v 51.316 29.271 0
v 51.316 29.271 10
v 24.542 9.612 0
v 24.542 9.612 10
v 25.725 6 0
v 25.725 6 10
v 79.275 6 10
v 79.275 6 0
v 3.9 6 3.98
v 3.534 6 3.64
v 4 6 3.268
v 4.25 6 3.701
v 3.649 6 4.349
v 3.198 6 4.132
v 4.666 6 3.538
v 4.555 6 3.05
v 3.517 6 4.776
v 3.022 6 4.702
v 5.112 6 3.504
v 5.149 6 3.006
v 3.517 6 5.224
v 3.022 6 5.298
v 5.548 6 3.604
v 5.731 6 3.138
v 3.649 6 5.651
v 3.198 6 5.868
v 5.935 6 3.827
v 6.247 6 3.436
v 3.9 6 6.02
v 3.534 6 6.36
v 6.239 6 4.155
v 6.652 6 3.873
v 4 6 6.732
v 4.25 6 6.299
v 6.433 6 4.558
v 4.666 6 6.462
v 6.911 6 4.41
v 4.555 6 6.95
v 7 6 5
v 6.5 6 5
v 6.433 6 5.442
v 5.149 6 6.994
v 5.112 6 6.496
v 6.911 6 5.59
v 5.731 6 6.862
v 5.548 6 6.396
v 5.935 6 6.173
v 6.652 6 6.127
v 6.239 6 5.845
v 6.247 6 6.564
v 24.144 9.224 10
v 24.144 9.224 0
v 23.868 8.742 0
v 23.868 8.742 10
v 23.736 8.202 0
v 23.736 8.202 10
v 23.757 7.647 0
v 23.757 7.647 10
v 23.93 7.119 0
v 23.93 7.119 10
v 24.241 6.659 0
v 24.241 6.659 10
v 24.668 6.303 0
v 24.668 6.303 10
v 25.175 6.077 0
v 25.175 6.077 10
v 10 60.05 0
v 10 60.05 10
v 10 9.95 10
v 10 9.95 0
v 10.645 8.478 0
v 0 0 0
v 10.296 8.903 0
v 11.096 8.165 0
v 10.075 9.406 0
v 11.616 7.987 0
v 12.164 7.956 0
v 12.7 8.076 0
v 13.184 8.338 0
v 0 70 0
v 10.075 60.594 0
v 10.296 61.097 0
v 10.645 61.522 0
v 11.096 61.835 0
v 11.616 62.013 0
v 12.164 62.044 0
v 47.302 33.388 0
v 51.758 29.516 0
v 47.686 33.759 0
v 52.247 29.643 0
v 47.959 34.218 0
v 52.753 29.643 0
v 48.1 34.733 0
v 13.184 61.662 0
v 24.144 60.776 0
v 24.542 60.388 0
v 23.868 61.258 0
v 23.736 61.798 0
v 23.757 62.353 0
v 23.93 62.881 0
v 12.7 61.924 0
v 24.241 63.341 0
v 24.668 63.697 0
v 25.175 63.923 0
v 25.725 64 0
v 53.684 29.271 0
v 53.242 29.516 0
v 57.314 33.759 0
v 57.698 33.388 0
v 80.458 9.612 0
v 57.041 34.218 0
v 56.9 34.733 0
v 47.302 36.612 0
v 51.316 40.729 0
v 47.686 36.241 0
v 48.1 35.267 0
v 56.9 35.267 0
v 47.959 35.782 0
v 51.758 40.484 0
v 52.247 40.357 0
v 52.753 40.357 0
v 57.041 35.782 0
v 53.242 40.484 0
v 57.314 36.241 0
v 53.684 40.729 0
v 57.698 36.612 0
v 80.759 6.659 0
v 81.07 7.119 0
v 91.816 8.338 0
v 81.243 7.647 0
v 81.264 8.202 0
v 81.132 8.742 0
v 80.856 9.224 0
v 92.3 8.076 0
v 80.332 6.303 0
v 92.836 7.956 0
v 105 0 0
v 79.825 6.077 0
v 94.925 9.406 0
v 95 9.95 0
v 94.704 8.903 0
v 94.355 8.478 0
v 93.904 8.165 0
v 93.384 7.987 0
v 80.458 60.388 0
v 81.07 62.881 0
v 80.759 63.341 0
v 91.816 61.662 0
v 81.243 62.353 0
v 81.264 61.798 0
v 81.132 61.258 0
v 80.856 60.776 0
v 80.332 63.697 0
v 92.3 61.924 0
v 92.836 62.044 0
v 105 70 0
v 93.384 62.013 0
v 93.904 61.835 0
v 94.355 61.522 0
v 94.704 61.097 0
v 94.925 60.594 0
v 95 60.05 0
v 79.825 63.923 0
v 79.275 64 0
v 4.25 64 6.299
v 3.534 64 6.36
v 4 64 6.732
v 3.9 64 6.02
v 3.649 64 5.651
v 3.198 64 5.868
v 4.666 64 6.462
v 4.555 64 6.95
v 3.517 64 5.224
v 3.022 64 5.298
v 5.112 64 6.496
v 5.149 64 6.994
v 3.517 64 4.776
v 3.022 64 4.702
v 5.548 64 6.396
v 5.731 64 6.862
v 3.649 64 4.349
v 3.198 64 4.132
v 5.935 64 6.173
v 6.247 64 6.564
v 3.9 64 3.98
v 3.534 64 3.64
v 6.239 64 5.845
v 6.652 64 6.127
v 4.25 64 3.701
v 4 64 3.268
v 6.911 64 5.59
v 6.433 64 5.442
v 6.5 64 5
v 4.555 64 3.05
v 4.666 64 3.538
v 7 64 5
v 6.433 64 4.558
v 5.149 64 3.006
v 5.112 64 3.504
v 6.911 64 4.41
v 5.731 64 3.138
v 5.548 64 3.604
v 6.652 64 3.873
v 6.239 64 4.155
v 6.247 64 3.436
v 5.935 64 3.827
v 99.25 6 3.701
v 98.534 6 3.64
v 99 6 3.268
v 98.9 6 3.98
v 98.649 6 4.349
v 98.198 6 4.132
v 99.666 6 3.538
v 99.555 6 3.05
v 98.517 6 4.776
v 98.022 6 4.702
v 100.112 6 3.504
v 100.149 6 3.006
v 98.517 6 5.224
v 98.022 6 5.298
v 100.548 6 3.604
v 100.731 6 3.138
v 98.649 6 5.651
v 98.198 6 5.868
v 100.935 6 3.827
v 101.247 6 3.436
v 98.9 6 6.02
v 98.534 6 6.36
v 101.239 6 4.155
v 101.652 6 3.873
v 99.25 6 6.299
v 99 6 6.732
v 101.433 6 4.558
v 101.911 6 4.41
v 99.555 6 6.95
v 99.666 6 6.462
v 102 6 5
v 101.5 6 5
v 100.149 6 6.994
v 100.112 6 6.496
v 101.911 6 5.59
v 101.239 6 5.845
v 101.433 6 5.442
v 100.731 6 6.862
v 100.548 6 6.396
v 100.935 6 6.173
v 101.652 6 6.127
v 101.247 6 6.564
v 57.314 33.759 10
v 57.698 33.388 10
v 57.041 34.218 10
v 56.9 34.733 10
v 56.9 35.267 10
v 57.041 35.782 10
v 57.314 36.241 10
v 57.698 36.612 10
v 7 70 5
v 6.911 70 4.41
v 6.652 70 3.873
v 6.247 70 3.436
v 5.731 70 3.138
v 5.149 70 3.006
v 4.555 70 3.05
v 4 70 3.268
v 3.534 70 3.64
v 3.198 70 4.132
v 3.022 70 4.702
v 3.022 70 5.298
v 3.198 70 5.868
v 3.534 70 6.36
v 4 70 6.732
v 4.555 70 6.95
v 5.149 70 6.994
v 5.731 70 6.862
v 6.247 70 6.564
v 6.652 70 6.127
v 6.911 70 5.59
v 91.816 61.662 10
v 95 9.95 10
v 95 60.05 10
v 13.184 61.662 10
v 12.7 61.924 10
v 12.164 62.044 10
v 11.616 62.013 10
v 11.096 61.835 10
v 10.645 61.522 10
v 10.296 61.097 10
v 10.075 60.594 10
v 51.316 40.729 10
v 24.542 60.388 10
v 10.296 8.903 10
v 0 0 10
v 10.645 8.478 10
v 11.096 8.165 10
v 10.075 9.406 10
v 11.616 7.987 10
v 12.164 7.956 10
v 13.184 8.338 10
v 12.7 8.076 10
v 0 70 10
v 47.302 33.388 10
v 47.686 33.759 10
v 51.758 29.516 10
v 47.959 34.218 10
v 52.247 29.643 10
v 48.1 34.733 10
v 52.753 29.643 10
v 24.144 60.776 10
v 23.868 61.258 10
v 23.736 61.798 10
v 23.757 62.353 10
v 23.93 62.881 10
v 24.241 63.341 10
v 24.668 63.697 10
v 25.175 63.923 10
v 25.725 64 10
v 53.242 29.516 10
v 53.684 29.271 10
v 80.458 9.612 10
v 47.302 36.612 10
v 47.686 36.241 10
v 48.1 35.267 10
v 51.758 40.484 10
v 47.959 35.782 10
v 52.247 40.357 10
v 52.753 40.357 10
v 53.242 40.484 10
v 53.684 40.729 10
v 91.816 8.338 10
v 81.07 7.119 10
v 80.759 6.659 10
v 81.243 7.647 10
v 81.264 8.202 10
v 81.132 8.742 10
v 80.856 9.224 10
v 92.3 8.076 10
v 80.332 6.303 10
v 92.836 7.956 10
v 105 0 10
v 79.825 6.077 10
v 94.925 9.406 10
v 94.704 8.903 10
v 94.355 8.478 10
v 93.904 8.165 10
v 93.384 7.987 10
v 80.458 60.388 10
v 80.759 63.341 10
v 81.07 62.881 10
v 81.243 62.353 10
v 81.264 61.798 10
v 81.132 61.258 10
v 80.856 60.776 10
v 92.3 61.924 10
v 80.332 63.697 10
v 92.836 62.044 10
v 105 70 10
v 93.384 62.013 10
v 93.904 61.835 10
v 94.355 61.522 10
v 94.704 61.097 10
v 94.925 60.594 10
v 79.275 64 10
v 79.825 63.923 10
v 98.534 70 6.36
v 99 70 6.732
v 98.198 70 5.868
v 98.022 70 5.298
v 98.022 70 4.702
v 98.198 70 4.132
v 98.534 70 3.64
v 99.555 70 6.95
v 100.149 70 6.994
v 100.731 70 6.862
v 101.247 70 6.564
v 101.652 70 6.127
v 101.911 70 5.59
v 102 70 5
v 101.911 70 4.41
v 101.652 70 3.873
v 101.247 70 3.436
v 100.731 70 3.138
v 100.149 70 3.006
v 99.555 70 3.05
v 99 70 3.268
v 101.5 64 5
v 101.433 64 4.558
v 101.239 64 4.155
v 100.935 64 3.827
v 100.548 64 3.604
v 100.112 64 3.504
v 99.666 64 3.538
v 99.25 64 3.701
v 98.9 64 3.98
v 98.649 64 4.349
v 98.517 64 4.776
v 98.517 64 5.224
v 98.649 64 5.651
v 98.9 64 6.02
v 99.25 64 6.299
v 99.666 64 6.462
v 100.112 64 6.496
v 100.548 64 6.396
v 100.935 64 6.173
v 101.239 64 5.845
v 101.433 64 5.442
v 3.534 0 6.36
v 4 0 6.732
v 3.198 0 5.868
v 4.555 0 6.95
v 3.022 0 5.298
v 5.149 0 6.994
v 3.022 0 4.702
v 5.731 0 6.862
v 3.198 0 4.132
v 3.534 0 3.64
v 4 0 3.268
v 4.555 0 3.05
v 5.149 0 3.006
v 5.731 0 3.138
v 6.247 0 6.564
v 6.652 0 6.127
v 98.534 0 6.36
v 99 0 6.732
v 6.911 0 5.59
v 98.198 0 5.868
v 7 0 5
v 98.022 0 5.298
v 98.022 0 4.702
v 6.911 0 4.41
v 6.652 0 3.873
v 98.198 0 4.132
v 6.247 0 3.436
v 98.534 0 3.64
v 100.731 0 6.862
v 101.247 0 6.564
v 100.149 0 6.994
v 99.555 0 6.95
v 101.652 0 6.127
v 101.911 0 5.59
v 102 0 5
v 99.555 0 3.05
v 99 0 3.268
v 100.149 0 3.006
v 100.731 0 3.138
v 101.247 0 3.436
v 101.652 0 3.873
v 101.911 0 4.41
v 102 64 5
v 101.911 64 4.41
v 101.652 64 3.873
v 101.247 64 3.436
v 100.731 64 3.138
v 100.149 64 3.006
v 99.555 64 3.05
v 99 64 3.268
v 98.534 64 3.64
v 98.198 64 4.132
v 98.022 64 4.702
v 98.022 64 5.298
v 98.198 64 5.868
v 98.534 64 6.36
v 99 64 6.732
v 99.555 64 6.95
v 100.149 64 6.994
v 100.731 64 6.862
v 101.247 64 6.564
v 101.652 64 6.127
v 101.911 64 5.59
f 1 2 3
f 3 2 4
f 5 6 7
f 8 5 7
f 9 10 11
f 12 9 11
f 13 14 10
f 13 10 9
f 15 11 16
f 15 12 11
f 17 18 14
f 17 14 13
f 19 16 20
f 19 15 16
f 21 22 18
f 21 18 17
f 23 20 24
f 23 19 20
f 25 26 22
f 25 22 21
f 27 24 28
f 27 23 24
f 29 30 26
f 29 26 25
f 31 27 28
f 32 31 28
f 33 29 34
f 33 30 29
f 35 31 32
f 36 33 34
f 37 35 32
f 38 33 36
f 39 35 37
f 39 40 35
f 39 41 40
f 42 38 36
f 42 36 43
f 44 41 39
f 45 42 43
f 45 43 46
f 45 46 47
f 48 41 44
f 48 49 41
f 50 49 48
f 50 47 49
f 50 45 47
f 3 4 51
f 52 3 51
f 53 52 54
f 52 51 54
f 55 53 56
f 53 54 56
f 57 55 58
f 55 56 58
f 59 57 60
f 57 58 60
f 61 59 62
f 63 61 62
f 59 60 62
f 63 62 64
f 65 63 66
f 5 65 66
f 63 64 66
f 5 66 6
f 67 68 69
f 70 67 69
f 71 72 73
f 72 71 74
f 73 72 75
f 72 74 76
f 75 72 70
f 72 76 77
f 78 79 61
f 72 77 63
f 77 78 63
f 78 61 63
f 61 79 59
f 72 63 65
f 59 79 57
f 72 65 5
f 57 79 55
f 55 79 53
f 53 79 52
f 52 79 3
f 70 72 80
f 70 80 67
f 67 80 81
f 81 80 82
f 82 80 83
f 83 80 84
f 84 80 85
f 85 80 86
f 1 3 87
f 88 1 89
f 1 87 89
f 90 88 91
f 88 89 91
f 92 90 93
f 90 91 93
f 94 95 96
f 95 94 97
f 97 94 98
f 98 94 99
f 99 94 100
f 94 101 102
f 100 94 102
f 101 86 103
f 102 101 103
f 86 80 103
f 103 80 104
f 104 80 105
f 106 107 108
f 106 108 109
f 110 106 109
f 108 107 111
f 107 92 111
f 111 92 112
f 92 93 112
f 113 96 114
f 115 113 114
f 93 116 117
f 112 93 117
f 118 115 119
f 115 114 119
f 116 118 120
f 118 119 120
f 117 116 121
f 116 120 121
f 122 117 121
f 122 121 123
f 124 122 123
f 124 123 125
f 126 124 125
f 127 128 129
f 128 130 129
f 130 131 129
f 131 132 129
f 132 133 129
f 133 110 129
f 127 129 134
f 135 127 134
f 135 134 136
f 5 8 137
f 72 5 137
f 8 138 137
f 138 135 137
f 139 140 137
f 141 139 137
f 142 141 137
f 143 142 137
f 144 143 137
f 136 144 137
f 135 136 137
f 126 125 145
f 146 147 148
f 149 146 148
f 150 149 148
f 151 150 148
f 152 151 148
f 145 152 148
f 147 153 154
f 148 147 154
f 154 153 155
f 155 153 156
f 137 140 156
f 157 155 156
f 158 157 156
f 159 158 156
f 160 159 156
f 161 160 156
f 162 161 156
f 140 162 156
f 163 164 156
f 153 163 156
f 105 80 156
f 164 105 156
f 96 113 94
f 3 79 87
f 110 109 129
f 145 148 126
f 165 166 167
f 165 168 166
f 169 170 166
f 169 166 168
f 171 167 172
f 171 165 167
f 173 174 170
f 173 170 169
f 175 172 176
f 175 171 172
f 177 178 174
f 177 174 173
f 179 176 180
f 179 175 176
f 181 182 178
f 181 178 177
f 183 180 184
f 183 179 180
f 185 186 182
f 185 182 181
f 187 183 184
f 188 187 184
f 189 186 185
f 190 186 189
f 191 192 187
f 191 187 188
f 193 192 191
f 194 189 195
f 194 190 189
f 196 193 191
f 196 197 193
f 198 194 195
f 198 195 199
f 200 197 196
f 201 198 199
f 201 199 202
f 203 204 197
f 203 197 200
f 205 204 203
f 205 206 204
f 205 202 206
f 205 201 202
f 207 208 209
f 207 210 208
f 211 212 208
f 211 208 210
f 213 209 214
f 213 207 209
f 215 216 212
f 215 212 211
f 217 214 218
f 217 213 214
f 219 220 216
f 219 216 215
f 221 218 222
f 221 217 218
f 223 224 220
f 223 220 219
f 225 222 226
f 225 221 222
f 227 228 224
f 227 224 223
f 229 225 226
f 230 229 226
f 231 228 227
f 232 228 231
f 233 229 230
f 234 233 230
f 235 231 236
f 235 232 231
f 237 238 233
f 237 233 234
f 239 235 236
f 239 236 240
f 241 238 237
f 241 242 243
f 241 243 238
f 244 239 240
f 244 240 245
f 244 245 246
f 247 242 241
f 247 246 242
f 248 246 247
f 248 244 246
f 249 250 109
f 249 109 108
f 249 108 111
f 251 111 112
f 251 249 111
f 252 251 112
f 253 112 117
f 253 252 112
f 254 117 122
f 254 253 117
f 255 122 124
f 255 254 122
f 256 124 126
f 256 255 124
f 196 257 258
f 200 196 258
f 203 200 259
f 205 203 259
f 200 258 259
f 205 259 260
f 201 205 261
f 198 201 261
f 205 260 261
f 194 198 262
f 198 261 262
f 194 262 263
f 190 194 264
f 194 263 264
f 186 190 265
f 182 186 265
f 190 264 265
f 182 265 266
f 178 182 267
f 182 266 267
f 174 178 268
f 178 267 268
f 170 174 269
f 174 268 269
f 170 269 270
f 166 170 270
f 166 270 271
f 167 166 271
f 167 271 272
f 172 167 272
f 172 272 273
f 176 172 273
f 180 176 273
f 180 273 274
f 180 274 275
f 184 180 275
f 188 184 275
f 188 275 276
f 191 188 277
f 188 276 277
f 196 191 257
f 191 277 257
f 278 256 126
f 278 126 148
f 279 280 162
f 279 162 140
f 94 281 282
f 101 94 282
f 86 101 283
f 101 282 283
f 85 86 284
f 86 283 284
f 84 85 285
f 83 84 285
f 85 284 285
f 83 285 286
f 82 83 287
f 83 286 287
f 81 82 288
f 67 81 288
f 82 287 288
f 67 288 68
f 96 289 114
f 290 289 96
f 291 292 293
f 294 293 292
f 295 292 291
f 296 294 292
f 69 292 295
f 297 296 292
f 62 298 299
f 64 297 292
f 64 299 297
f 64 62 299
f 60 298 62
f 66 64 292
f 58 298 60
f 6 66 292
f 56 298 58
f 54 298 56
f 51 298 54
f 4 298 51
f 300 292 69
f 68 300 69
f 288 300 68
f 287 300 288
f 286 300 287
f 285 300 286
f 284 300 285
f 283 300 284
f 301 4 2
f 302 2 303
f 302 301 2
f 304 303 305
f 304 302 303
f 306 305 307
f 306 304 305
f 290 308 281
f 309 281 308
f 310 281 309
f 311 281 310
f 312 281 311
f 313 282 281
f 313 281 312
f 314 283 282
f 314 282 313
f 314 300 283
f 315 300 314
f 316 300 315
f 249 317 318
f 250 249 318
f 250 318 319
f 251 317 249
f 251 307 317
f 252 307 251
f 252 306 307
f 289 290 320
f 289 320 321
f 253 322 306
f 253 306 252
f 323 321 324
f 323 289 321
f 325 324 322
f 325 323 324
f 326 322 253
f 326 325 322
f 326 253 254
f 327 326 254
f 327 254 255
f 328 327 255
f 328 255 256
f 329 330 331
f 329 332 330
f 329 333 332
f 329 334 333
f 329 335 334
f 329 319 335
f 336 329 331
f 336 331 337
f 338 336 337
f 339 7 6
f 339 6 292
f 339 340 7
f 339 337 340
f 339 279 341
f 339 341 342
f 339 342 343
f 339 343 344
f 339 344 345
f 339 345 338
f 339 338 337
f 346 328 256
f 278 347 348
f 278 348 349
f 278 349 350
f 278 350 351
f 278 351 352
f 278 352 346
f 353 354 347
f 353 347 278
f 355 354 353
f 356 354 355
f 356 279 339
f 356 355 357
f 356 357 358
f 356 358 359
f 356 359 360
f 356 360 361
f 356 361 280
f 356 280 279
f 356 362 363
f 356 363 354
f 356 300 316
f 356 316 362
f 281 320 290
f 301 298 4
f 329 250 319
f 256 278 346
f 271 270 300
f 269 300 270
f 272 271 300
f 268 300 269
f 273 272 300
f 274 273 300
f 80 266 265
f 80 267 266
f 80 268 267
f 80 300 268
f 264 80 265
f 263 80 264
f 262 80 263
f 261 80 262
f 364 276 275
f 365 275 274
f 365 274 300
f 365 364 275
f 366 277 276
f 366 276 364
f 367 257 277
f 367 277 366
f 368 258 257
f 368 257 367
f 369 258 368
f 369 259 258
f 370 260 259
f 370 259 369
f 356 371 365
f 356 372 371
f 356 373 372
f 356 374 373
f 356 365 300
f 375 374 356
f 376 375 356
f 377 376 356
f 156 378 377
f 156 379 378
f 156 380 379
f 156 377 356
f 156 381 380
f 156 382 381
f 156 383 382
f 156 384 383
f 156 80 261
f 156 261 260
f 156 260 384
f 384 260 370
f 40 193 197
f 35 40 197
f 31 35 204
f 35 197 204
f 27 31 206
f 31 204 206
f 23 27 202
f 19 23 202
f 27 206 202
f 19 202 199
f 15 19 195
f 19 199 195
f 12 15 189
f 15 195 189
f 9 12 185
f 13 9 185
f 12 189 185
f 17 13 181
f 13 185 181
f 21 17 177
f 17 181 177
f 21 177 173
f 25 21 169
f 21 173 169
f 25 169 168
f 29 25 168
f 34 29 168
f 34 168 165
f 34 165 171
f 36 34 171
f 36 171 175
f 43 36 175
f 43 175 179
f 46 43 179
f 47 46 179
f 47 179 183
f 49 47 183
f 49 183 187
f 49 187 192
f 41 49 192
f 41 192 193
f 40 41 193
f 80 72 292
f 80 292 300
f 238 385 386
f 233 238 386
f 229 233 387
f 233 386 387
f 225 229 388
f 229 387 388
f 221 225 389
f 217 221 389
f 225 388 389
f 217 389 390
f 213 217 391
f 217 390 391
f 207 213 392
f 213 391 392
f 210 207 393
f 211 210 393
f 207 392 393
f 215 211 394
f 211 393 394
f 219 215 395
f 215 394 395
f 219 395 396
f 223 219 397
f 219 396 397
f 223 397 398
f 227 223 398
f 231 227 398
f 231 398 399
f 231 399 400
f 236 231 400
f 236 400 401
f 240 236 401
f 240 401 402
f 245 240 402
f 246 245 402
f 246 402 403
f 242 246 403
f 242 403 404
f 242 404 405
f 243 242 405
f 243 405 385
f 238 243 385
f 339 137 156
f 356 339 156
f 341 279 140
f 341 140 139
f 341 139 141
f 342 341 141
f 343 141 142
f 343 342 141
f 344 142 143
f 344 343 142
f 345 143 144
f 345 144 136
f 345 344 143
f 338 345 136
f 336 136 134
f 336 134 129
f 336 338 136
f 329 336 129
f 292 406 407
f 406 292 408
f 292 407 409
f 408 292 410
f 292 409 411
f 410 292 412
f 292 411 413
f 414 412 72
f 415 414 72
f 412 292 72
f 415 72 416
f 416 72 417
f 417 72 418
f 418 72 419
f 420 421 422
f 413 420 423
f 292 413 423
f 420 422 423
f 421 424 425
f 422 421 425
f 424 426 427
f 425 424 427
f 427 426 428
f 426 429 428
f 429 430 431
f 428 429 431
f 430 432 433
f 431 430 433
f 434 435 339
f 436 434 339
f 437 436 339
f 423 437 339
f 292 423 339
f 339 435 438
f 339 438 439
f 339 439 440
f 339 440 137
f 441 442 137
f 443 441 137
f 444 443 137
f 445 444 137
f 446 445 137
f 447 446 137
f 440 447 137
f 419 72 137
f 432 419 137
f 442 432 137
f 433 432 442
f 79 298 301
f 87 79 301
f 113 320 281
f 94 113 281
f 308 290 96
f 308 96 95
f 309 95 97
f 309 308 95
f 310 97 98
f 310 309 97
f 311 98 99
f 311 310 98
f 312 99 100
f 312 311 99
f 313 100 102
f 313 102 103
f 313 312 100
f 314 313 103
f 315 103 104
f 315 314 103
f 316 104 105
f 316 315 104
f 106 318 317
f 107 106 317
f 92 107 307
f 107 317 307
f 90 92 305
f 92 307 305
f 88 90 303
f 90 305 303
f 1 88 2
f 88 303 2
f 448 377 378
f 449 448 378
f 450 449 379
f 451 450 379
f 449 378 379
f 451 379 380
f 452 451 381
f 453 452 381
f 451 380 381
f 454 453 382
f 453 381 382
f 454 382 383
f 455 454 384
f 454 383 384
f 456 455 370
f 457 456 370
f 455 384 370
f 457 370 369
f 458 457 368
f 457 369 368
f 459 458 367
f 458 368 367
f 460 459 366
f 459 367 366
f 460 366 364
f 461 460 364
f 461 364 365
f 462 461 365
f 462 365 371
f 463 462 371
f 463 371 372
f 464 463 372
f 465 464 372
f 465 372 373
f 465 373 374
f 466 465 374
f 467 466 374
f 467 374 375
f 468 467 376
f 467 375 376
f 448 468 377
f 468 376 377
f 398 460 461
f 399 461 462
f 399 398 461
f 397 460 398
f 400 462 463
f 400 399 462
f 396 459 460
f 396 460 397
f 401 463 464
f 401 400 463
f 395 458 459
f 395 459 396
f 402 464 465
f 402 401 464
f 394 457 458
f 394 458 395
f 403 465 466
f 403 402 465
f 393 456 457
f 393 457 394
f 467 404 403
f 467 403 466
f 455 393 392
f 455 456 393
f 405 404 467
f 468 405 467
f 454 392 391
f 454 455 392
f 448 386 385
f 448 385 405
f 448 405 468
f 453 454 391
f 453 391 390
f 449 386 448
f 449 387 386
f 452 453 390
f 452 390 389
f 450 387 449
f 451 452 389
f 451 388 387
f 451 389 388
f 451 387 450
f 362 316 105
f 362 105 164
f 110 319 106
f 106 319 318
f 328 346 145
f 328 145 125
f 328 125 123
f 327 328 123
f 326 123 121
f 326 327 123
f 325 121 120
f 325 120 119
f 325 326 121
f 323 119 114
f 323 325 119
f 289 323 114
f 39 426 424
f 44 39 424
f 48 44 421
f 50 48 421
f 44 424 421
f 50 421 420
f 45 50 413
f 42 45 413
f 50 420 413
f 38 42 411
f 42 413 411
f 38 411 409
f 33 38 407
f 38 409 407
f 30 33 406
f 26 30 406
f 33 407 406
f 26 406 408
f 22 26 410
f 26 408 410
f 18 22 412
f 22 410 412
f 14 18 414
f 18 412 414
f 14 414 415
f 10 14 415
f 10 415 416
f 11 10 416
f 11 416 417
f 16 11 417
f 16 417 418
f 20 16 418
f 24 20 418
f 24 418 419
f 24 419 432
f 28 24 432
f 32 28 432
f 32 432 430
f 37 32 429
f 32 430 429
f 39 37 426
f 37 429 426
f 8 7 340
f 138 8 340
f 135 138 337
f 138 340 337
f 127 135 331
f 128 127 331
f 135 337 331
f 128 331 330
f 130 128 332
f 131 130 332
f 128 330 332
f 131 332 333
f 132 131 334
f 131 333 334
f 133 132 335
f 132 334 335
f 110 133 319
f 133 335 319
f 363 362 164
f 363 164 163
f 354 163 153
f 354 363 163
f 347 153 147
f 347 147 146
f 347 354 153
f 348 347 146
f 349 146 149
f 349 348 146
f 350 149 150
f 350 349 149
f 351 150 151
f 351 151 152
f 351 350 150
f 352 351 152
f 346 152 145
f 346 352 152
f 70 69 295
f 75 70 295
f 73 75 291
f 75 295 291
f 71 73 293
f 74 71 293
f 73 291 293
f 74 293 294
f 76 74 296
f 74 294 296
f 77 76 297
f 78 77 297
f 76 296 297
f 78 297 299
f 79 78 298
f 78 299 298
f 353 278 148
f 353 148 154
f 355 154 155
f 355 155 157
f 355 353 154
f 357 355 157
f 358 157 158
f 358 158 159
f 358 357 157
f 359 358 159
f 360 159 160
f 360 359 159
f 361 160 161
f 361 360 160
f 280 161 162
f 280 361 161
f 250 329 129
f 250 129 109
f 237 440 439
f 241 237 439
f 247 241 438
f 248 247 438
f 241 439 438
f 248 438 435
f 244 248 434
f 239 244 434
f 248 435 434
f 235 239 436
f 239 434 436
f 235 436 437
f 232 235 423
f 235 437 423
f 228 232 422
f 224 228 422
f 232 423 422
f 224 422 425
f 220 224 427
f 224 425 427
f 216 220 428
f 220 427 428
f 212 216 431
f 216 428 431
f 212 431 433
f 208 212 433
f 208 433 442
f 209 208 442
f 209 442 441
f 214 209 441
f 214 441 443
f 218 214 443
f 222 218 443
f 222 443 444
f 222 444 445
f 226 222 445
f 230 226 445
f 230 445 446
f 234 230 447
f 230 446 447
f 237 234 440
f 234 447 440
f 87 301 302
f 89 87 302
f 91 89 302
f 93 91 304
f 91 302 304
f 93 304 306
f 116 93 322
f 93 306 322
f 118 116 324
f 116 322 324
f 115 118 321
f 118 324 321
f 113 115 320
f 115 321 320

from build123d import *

# Parameters (mm, degrees)
SKIZZE1_W                       = 105
SKIZZE1_H                       = 70
AUFSATZ_LINEAR_AUSTRAGEN1_DEPTH = 10
SCHNITT_LINEAR_AUSTRAGEN1_DEPTH = 10
SKIZZE3_R                       = 1.5
SCHNITT_LINEAR_AUSTRAGEN2_DEPTH = 71
SKIZZE4_R                       = 2
SCHNITT_LINEAR_AUSTRAGEN3_DEPTH = 6
SKIZZE5_R                       = 2
SCHNITT_LINEAR_AUSTRAGEN4_DEPTH = 6


with BuildPart() as part:
    # Skizze1 → Aufsatz-Linear austragen1 (new body)
    with BuildSketch(Plane.XY):
        with Locations((52.5, 35)):
            Rectangle(SKIZZE1_W, SKIZZE1_H)
    extrude(amount=AUFSATZ_LINEAR_AUSTRAGEN1_DEPTH)

    # Skizze2 → Schnitt-Linear austragen1 (cut)
    with BuildSketch(Plane.XY.offset(10)):
        with BuildLine():
            Line((10, 60.05034464), (10, 9.94965536))
            ThreePointArc((10, 9.94965536), (11.096486968, 8.165372815), (13.183664201, 8.337532828))
            Line((13.183664201, 8.337532828), (47.301638716, 33.387877468))
            ThreePointArc((47.301638716, 33.387877468), (48.117974515, 35), (47.301638716, 36.612122532))
            Line((47.301638716, 36.612122532), (13.183664201, 61.662467172))
            ThreePointArc((13.183664201, 61.662467172), (11.096486968, 61.834627185), (10, 60.05034464))
        make_face()
        with BuildLine():
            Line((51.316335799, 40.729297855), (24.54181721, 60.387877468))
            ThreePointArc((24.54181721, 60.387877468), (23.824922931, 62.622798095), (25.72548141, 64))
            Line((25.72548141, 64), (79.27451859, 64))
            ThreePointArc((79.27451859, 64), (81.175077069, 62.622798095), (80.45818279, 60.387877468))
            Line((80.45818279, 60.387877468), (53.683664201, 40.729297855))
            ThreePointArc((53.683664201, 40.729297855), (52.5, 40.341420387), (51.316335799, 40.729297855))
        make_face()
        with BuildLine():
            Line((25.72548141, 6), (79.27451859, 6))
            ThreePointArc((79.27451859, 6), (81.175077069, 7.377201905), (80.45818279, 9.612122532))
            Line((80.45818279, 9.612122532), (53.683664201, 29.270702145))
            ThreePointArc((53.683664201, 29.270702145), (52.5, 29.658579613), (51.316335799, 29.270702145))
            Line((51.316335799, 29.270702145), (24.54181721, 9.612122532))
            ThreePointArc((24.54181721, 9.612122532), (23.824922931, 7.377201905), (25.72548141, 6))
        make_face()
        with BuildLine():
            Line((95, 60.05034464), (95, 9.94965536))
            ThreePointArc((95, 9.94965536), (93.903513032, 8.165372815), (91.816335799, 8.337532828))
            Line((91.816335799, 8.337532828), (57.698361284, 33.387877468))
            ThreePointArc((57.698361284, 33.387877468), (56.882025485, 35), (57.698361284, 36.612122532))
            Line((57.698361284, 36.612122532), (91.816335799, 61.662467172))
            ThreePointArc((91.816335799, 61.662467172), (93.903513032, 61.834627185), (95, 60.05034464))
        make_face()
    extrude(amount=-SCHNITT_LINEAR_AUSTRAGEN1_DEPTH, mode=Mode.SUBTRACT)

    # Skizze3 → Schnitt-Linear austragen2 (cut, through all)
    with BuildSketch(Plane(origin=(0, 70, 0), x_dir=(1, 0, 0), z_dir=(0, 1, 0))):
        with Locations((5, -5)):
            Circle(SKIZZE3_R)
        with Locations((100, -5)):
            Circle(SKIZZE3_R)
    extrude(amount=-SCHNITT_LINEAR_AUSTRAGEN2_DEPTH, mode=Mode.SUBTRACT)

    # Skizze4 → Schnitt-Linear austragen3 (cut)
    with BuildSketch(Plane.XZ):
        with Locations((5, 5)):
            Circle(SKIZZE4_R)
        with Locations((100, 5)):
            Circle(SKIZZE4_R)
    extrude(amount=-SCHNITT_LINEAR_AUSTRAGEN3_DEPTH, mode=Mode.SUBTRACT)

    # Skizze5 → Schnitt-Linear austragen4 (cut)
    with BuildSketch(Plane(origin=(0, 70, 0), x_dir=(1, 0, 0), z_dir=(0, 1, 0))):
        with Locations((5, -5)):
            Circle(SKIZZE5_R)
        with Locations((100, -5)):
            Circle(SKIZZE5_R)
    extrude(amount=-SCHNITT_LINEAR_AUSTRAGEN4_DEPTH, mode=Mode.SUBTRACT)


solid = part.part
